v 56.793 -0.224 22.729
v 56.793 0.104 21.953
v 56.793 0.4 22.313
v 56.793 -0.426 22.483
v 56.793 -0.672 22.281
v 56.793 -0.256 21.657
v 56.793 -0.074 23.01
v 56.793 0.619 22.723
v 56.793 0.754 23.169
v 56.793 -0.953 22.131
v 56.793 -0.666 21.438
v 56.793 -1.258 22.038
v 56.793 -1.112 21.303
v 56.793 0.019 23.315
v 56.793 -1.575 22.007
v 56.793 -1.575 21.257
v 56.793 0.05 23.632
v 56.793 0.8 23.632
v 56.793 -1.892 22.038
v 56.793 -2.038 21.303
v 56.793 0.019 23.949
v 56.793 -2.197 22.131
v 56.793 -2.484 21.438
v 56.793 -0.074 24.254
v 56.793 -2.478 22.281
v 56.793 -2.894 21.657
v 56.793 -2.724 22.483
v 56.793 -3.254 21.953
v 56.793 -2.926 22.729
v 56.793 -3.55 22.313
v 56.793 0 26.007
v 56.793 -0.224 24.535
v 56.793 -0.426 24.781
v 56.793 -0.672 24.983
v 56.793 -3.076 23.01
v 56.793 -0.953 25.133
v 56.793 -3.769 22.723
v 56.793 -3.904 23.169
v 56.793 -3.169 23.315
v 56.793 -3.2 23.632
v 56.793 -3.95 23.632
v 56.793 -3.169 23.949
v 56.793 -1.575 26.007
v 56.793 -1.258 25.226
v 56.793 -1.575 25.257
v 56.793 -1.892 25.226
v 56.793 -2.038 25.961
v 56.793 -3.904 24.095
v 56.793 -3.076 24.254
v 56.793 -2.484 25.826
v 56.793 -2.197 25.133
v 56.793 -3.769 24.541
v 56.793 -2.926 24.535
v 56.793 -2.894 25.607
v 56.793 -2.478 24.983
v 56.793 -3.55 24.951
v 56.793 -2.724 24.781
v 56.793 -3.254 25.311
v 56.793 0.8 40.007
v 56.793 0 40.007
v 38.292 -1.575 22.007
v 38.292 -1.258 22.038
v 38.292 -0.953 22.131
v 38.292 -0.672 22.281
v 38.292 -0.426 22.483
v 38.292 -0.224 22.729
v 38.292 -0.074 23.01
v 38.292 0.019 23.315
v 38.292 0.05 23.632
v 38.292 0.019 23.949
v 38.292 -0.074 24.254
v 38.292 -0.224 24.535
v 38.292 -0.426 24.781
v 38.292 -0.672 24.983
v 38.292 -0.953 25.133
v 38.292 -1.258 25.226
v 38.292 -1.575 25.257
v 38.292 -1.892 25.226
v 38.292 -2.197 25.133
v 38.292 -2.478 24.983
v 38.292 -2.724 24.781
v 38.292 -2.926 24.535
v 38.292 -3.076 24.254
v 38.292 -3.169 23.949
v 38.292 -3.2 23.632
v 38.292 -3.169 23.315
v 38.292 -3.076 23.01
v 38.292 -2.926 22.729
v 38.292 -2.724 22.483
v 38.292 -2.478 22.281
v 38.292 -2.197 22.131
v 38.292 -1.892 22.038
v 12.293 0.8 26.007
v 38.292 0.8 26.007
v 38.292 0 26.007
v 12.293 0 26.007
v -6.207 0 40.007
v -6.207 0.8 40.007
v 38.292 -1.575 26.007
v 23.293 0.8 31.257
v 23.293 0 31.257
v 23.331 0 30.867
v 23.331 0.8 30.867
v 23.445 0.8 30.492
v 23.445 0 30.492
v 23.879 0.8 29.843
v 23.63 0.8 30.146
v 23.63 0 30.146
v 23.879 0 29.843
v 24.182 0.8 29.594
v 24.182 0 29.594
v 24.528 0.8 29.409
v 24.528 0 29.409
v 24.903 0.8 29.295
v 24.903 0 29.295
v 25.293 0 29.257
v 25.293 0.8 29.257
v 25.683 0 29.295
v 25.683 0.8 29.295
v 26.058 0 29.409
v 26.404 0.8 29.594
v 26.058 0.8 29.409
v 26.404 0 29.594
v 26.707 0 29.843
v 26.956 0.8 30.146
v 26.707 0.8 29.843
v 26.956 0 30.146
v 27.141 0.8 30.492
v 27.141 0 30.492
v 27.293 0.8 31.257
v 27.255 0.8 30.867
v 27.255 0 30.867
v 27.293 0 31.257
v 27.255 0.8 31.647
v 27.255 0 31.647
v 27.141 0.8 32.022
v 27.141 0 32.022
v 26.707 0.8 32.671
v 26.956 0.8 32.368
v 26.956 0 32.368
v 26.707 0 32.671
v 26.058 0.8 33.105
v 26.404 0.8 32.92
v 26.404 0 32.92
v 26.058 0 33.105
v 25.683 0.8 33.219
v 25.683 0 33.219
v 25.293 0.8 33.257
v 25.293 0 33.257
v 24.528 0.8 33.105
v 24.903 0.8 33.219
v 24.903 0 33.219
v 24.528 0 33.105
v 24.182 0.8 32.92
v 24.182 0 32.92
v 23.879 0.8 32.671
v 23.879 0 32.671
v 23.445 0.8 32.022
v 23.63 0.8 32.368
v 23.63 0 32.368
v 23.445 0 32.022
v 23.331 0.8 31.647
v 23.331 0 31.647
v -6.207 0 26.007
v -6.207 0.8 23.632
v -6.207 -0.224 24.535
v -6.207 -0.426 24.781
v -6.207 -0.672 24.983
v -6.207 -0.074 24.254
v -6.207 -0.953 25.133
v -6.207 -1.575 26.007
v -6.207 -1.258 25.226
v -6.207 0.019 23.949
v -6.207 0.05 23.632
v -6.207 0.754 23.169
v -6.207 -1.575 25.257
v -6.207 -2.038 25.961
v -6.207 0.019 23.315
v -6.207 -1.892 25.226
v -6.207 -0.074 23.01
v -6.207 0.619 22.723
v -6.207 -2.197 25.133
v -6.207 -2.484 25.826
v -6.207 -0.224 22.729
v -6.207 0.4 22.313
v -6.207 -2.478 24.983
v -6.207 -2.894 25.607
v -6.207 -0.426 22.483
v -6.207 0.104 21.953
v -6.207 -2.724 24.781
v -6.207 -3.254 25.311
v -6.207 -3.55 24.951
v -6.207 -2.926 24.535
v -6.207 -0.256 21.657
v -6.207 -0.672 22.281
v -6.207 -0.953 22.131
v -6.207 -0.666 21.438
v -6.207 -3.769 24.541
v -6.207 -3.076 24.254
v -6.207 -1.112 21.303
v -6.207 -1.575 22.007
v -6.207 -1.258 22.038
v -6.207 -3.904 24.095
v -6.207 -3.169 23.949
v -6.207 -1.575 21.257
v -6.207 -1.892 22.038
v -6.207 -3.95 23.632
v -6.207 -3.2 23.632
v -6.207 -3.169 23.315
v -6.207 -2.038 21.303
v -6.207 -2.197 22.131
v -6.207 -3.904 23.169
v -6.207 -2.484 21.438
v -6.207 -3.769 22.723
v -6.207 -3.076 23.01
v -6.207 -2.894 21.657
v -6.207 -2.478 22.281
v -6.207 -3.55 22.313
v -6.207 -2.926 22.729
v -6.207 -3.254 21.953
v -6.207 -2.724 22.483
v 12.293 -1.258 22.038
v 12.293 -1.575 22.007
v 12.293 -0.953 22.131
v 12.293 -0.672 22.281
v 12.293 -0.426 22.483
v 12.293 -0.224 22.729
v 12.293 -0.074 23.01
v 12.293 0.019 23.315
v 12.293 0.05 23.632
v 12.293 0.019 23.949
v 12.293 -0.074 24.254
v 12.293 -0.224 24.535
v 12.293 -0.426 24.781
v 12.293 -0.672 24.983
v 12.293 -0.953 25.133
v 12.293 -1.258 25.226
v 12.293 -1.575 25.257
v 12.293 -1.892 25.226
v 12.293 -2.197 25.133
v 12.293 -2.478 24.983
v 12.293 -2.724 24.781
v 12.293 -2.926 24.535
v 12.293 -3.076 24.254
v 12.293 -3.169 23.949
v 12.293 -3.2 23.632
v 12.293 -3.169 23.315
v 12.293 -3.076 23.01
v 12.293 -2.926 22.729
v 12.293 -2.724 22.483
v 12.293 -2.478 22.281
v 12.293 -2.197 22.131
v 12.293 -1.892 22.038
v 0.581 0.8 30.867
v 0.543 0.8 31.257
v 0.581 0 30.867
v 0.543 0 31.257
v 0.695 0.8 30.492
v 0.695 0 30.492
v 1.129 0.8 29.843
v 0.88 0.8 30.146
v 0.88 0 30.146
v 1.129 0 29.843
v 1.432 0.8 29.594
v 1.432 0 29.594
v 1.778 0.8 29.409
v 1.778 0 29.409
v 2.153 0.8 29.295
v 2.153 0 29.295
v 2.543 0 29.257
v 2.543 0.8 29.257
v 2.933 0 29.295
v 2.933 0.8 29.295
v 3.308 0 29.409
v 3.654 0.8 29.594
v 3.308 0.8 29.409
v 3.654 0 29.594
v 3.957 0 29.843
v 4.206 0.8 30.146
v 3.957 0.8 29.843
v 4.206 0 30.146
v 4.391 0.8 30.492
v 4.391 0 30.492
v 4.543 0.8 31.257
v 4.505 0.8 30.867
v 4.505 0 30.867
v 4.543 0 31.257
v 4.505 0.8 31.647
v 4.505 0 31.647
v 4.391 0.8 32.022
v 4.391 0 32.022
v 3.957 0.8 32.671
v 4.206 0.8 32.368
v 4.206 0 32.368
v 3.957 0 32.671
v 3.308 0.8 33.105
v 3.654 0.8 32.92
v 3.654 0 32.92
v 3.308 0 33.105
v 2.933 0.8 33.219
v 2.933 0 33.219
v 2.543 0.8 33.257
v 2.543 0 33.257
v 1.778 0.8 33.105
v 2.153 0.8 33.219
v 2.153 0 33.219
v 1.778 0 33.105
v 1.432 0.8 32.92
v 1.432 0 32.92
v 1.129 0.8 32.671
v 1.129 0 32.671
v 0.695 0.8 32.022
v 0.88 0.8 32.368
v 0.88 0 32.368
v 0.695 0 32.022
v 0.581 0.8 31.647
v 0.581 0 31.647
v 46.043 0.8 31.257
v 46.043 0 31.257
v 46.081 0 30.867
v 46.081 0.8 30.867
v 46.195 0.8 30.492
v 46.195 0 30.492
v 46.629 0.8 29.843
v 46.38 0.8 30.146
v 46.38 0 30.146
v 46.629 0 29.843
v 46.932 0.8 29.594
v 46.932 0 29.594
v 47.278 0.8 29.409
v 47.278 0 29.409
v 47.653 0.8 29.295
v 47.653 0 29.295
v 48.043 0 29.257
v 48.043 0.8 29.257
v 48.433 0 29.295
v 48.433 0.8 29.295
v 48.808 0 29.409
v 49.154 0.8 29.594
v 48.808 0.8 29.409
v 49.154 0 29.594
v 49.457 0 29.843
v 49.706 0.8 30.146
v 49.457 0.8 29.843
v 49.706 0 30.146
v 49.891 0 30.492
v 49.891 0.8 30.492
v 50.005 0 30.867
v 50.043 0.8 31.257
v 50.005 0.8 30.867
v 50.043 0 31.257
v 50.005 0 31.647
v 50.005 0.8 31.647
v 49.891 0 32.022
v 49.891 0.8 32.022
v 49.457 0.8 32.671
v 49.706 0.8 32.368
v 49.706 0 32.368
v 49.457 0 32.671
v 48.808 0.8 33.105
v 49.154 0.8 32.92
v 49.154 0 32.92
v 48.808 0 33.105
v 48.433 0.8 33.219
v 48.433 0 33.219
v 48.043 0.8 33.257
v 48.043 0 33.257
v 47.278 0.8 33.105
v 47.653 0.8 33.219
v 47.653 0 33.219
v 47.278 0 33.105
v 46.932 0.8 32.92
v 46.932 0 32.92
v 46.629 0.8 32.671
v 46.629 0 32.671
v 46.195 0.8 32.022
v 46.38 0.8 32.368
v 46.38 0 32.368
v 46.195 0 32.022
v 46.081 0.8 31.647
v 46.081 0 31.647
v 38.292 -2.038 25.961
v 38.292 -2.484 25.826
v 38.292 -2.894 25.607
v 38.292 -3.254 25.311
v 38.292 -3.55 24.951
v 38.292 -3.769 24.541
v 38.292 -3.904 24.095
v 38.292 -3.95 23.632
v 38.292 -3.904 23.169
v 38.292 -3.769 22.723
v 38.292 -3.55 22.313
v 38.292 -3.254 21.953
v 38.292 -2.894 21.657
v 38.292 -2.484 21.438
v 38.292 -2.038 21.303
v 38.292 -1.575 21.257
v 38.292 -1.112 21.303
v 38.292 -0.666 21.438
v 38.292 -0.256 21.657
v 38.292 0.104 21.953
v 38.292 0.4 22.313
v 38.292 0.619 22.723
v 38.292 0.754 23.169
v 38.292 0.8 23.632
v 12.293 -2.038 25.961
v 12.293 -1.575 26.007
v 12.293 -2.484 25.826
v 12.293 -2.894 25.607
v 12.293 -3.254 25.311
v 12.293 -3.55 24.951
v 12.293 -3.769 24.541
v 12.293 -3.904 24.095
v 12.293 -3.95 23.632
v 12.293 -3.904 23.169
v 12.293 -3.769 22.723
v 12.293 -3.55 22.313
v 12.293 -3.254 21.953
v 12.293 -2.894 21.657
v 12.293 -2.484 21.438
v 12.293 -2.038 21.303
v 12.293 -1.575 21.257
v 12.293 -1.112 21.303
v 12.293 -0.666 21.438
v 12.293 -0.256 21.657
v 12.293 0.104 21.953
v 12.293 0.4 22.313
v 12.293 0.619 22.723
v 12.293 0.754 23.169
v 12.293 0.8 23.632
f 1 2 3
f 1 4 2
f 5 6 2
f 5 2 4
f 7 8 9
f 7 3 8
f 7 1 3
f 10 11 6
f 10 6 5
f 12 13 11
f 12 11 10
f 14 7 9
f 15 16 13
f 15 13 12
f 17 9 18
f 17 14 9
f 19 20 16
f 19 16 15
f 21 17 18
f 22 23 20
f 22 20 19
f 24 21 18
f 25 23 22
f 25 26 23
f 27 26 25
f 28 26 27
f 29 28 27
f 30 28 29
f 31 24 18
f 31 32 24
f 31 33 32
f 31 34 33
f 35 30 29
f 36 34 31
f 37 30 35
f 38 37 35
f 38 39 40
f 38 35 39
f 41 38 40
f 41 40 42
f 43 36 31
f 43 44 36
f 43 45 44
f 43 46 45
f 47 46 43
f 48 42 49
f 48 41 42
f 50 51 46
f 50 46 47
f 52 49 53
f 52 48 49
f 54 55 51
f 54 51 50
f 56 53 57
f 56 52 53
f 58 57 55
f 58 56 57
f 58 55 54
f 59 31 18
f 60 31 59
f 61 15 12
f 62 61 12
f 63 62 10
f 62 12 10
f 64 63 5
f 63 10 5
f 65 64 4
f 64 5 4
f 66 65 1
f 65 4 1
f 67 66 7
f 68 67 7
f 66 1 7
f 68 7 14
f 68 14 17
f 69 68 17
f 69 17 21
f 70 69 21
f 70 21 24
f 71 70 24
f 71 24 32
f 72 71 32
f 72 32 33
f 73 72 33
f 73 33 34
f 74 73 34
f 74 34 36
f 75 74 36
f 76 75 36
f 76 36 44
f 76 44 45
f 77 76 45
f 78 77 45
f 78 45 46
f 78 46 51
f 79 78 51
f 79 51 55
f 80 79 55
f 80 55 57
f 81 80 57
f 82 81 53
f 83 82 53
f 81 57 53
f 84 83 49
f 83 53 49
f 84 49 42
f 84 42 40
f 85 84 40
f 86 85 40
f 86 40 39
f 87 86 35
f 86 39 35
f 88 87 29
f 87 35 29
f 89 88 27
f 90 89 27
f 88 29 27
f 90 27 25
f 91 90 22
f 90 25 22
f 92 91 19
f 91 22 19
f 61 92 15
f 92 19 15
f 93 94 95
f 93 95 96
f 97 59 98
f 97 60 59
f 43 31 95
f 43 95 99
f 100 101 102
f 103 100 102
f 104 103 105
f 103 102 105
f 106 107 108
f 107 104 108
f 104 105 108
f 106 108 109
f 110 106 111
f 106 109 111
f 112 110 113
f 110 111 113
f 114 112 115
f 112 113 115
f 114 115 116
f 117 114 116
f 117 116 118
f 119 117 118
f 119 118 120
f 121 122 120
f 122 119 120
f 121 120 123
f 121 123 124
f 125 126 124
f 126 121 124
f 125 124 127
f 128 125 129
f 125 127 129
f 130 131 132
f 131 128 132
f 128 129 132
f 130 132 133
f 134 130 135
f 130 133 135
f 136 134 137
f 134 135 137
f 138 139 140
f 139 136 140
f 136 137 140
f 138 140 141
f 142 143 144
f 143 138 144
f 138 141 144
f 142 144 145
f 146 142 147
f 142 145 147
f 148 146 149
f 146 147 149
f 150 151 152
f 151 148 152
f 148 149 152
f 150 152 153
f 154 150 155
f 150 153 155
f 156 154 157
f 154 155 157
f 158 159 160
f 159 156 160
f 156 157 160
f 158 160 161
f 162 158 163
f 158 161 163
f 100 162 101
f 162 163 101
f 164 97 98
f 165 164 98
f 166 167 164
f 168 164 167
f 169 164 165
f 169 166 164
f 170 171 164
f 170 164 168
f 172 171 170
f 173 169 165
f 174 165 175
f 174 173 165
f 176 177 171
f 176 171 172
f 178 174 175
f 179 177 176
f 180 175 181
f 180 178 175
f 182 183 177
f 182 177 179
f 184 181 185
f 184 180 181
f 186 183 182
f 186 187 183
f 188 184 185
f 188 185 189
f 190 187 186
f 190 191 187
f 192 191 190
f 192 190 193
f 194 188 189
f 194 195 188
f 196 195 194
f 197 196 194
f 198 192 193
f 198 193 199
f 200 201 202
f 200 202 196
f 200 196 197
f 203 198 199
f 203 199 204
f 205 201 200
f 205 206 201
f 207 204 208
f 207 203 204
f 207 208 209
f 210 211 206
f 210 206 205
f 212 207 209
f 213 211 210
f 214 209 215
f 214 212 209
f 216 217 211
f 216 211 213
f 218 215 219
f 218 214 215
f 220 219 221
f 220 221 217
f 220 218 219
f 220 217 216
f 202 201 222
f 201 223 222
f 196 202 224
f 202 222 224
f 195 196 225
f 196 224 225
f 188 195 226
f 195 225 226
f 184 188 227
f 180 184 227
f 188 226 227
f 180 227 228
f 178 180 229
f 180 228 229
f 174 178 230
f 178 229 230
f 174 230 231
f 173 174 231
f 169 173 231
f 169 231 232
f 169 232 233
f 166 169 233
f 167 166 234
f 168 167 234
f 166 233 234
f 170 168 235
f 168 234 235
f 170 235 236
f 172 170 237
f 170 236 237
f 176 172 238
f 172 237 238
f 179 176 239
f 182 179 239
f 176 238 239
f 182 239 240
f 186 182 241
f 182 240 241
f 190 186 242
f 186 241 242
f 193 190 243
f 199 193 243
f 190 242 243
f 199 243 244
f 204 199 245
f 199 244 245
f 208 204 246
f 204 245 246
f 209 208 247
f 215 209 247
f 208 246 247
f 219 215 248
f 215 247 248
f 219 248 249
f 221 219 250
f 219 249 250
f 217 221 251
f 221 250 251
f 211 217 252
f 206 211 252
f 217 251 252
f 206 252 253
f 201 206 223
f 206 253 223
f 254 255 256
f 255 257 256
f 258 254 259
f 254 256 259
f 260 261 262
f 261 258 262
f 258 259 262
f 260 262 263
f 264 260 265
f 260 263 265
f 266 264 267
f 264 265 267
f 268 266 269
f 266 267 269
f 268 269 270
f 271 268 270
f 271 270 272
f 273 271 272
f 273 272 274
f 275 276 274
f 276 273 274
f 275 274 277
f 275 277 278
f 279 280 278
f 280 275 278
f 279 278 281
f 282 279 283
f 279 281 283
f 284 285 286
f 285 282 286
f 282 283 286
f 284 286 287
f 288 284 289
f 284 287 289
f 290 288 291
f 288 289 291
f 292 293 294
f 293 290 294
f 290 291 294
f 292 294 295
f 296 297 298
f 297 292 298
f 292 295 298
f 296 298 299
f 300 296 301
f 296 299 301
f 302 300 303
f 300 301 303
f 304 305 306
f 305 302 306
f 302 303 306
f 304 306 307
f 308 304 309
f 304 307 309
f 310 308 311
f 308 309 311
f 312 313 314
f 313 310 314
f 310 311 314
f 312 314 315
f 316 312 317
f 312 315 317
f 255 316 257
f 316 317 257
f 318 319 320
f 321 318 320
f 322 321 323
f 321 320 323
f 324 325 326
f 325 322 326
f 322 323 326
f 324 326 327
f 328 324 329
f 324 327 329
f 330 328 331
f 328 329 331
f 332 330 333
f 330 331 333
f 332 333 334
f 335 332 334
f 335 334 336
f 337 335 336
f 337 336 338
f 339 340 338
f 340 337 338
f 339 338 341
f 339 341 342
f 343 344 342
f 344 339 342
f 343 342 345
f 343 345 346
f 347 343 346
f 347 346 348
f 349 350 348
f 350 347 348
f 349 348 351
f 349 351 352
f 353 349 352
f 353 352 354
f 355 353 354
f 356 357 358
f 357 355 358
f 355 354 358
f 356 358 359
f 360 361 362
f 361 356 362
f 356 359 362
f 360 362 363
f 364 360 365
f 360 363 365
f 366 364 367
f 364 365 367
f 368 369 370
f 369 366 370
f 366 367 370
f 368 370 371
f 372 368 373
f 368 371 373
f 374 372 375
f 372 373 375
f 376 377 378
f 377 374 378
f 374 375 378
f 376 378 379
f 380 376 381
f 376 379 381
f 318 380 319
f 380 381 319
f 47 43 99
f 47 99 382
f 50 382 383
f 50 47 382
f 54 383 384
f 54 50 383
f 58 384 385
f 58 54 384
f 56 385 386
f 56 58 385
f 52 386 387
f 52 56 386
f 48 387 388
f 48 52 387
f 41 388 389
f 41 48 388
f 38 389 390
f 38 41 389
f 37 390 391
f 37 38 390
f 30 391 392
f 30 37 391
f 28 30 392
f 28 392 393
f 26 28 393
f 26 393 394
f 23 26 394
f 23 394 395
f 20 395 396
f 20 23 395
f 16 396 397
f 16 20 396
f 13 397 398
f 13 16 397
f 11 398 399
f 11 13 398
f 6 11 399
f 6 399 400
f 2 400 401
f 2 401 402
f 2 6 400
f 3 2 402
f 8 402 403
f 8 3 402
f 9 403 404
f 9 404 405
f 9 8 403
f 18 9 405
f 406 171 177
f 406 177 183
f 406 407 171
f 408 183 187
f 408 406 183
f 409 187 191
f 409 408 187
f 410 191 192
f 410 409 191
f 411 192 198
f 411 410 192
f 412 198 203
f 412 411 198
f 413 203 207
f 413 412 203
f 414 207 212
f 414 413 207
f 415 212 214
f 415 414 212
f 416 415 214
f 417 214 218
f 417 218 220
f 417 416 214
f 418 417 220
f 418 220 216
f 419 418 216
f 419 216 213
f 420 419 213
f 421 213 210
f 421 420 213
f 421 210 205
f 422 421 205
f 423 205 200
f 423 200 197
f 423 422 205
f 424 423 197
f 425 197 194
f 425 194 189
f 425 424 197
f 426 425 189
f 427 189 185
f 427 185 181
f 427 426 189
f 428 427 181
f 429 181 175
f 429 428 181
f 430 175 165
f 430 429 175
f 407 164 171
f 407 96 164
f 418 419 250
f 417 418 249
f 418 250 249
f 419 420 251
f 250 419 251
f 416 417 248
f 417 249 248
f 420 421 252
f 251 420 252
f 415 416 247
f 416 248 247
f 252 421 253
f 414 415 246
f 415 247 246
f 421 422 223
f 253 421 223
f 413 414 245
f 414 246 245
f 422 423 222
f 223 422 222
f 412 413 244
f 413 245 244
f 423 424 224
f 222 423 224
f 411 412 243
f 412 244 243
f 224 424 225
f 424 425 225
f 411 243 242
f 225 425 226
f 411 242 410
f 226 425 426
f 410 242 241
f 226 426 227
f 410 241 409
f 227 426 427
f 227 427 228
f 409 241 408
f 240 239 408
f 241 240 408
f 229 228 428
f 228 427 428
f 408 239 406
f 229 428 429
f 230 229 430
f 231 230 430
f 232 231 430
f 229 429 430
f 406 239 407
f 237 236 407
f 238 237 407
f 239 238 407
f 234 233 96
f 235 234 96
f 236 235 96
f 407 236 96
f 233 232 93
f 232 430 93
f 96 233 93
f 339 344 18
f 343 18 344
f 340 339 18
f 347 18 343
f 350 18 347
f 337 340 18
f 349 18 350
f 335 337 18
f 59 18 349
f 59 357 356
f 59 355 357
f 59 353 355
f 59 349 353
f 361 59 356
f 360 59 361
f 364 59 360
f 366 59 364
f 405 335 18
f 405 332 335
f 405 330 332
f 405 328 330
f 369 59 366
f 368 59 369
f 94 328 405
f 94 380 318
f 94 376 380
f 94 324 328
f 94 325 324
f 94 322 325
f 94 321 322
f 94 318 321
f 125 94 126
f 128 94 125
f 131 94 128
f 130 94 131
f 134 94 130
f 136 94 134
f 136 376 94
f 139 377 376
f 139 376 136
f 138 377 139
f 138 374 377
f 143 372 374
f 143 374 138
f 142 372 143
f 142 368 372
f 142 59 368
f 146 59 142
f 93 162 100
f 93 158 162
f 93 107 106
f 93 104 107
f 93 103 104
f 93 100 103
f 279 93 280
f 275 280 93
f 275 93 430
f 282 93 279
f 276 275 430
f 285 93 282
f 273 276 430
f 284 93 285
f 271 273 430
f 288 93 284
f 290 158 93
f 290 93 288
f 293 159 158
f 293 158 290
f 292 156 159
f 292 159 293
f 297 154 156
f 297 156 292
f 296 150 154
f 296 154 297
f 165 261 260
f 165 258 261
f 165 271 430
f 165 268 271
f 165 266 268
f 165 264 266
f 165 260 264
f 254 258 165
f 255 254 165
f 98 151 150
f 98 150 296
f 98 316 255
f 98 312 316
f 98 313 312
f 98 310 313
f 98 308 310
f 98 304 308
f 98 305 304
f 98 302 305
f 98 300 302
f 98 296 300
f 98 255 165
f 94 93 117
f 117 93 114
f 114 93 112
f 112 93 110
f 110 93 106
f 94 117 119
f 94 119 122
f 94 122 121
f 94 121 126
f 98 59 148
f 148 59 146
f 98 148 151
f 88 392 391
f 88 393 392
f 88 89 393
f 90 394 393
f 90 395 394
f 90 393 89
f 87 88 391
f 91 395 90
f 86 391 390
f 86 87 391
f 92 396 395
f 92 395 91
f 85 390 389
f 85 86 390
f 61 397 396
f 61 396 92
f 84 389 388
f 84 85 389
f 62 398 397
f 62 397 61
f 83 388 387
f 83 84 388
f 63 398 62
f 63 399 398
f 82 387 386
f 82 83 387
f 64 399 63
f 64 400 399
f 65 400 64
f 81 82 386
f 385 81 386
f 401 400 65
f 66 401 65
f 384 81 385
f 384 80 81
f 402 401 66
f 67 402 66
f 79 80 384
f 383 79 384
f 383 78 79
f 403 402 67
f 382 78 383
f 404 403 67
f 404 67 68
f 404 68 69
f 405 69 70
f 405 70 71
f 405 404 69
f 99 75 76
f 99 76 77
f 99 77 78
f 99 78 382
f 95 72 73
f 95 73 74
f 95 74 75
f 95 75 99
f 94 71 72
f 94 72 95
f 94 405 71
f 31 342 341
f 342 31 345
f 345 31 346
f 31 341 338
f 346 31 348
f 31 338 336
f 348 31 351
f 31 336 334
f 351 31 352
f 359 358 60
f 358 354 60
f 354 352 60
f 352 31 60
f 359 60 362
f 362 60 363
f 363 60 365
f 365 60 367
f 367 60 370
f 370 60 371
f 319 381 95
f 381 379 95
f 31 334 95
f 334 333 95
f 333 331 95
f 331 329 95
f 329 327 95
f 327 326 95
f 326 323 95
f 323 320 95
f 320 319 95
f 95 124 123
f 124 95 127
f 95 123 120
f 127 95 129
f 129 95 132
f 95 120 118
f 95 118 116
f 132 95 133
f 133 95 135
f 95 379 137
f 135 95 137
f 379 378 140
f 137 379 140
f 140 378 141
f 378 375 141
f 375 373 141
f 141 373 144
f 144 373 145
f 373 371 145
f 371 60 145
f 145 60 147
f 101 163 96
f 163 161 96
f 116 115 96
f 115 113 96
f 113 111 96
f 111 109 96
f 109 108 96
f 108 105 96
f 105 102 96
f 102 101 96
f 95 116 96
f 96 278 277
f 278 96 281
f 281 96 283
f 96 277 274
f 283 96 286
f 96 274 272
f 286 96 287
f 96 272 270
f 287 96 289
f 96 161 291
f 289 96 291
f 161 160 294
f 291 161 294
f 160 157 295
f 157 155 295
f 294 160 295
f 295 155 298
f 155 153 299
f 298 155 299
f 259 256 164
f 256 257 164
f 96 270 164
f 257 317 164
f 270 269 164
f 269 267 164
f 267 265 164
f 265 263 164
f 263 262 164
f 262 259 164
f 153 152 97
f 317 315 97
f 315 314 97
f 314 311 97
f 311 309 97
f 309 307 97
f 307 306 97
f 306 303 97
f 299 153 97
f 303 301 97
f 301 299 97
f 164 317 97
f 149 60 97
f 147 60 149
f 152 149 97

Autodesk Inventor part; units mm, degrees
ref_plane "YZ Plane" through (0, 0, 0) normal (1, 0, 0) x (0, 1, 0)
ref_plane "XZ Plane" through (0, 0, 0) normal (0, 1, 0) x (-1, 0, 0)
ref_plane "XY Plane" through (0, 0, 0) normal (0, 0, 1) x (1, 0, 0)
sketch "Boceto1" plane through (0, 0, 0) normal (0, 1, 0) x (-1, 0, 0)
  line L0 (6.207, 40.007) -> (6.207, 26.007)
  line L1 (6.207, 26.007) -> (-56.793, 26.007)
  line L2 (-56.793, 26.007) -> (-56.793, 40.007)
  line L3 (-56.793, 40.007) -> (6.207, 40.007)
  circle A0 centre (-2.543, 31.257) radius 2
  circle A1 centre (-48.043, 31.257) radius 2
  circle A2 centre (-25.293, 31.257) radius 2
  point P0 (0, 0)
  dimension "d0" = 14
  dimension "d1" = 63
  dimension "d33" = 4
  dimension "d34" = 4
  dimension "d35" = 4
  dimension "d36" = 8.75
  dimension "d37" = 8.75
  dimension "d38" = 8.75
  dimension "d39" = 8.75
  dimension "d40" = 8.75
  dimension "d41" = 31.5
extrude "Extrusión1" add sketch "Boceto1" along normal blind 0.8
sketch "Boceto7" plane through (56.793, 0, 40.007) normal (1, 0, 0) x (0, 0, -1)
  circle A0 centre (16.375, -1.575) radius 2.375
  circle A1 centre (16.375, -1.575) radius 1.625
  line L0 (14, 0) -> (14, 0.8) projected
  line L1 (0, 0.8) -> (14, 0.8) projected
  line L2 (0, 0) -> (14, 0) projected
  line L3 (14, 0) -> (14, -1.575)
  line L4 (14, 0.8) -> (16.375, 0.8)
  line L5 (14, 0.8) -> (14, 0)
  point P0 (40.007, 0)
  dimension "d25" = 4.75
  dimension "d26" = 3.25
extrude "Extrusión4" add sketch "Boceto7" against normal blind 63
sketch "Boceto9" plane through (0, 0.8, 0) normal (0, 1, 0) x (1, 0, 0)
  line L0 (-6.207, -25.257) -> (56.793, -25.257) projected
  line L1 (-6.207, -40.007) -> (-6.207, -23.632) projected
  line L2 (12.293, -25.007) -> (12.293, -15.007)
  line L3 (12.293, -15.007) -> (38.2918, -15.007)
  line L4 (38.2918, -15.007) -> (38.2918, -25.257)
  line L5 (38.2918, -25.257) -> (38.2918, -26.007)
  line L6 (56.793, -26.007) -> (-6.207, -26.007) projected
  line L7 (12.293, -25.007) -> (12.293, -26.007)
  line L8 (12.293, -26.007) -> (38.2918, -26.007)
  line L9 (56.793, -25.257) -> (38.2918, -25.257)
  line L10 (12.293, -25.007) -> (-6.207, -25.007)
  point P0 (0, 0)
  point P1 (38.2918, -25.257)
  point P2 (12.293, -25.257)
  point P3 (38.2918, -25.257)
  dimension "d43" = 26
extrude "Extrusión6" cut sketch "Boceto9" against normal blind 63 contours L7 L2 L3 L4 L0 | L0 L5 L6 L7
properties part number "Ala 1 Bisagra tipo Libro Chica"
